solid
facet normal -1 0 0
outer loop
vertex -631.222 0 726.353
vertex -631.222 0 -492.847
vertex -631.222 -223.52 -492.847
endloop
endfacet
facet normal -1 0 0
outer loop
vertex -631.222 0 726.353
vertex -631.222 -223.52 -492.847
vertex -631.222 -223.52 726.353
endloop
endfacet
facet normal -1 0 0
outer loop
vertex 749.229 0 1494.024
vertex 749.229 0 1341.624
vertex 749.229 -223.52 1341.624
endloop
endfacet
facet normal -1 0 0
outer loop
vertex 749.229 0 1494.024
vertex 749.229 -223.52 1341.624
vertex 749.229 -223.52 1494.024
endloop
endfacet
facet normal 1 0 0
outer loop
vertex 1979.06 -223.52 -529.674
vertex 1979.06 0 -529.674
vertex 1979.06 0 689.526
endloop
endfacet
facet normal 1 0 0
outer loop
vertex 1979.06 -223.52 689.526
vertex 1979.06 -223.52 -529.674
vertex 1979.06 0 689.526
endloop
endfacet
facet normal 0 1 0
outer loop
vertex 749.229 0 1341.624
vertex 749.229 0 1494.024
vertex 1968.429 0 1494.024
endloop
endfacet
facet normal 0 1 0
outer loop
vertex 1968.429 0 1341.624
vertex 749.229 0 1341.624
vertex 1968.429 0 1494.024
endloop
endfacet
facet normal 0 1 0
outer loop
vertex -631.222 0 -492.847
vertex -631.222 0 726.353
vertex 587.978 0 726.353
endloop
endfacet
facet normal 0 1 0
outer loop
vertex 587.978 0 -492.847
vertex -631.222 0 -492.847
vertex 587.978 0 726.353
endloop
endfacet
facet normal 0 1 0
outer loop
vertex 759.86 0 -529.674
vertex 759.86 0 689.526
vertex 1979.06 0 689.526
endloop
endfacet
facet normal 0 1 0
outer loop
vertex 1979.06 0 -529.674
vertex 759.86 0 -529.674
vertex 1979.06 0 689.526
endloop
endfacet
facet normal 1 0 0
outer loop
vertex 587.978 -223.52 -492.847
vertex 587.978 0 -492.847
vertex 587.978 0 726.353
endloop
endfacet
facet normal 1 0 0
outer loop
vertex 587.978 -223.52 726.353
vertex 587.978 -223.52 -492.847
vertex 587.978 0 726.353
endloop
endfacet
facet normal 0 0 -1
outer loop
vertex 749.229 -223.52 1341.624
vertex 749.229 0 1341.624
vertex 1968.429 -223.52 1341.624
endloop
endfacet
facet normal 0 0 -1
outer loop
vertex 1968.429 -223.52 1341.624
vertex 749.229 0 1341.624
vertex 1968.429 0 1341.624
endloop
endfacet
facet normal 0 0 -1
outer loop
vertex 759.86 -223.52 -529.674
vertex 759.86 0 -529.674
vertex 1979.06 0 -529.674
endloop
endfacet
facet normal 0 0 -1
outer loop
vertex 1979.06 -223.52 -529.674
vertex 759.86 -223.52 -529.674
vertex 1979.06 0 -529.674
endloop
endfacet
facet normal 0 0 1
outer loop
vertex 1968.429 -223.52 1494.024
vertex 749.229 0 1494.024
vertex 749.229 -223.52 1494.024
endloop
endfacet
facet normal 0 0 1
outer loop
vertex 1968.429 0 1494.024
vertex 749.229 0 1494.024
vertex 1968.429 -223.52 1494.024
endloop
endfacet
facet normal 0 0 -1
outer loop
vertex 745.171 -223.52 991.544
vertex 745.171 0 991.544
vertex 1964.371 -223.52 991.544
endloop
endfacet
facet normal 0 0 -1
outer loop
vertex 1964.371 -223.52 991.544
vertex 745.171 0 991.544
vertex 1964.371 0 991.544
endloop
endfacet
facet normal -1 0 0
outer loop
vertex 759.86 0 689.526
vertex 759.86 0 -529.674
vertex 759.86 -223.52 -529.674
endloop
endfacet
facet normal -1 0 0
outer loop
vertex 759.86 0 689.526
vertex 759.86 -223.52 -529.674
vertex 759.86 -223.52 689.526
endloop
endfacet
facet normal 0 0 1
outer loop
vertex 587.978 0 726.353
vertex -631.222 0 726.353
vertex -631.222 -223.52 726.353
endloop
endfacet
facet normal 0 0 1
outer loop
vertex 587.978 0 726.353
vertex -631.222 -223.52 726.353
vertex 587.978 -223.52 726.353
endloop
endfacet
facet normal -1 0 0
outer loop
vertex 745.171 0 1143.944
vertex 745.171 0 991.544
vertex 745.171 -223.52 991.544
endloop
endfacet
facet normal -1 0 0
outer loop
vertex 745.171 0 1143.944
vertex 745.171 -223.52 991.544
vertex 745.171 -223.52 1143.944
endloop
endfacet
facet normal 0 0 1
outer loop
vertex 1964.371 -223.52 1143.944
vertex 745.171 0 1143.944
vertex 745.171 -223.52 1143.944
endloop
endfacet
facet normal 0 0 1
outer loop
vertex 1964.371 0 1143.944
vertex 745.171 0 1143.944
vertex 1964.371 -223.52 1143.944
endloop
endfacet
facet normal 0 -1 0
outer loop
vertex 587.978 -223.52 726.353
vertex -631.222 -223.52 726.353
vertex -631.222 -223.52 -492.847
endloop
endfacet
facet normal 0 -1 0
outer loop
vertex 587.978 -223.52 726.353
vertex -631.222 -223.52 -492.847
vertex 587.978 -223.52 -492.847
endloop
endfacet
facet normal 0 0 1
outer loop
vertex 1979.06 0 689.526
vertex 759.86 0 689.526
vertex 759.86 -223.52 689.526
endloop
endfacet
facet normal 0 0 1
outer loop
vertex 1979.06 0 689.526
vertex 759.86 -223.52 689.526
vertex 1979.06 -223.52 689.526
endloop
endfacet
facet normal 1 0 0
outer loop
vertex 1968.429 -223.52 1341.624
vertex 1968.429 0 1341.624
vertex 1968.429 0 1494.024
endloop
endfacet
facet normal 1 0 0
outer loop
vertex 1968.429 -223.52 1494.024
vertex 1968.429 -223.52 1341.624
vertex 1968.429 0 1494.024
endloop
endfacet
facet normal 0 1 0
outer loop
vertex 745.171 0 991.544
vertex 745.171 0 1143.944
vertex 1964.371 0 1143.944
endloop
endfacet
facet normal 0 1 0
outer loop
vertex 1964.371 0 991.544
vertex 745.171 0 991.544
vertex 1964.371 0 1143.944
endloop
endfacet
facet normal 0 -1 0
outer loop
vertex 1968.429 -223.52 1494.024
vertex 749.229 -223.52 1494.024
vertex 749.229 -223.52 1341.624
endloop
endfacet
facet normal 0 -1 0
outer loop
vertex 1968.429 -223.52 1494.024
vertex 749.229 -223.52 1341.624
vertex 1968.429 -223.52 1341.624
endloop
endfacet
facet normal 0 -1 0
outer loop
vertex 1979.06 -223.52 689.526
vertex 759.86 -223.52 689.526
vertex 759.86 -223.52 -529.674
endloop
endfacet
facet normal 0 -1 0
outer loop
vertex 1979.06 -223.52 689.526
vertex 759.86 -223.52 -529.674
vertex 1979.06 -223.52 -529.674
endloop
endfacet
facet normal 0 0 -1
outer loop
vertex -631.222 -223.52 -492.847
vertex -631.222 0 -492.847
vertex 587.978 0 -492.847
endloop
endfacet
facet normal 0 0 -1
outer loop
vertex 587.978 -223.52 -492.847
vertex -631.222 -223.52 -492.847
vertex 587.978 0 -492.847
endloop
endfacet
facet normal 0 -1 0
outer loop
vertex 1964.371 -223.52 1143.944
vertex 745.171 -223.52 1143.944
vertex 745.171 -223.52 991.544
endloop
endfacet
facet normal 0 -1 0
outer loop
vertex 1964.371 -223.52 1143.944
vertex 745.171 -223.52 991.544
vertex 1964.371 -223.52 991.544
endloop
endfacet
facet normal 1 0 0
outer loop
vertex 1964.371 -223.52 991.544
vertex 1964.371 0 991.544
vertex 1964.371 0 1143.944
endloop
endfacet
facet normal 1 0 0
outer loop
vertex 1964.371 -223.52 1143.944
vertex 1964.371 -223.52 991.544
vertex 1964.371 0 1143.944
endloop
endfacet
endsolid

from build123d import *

# Parameters (mm, degrees)
F0_W     = 1219.2
F0_H     = 1219.2
F3_W     = 1219.2
F3_H     = 1219.2
F2_W     = 1219.2
F2_H     = 152.4
F1_W     = 1219.2
F1_H     = 152.4
F4_DEPTH = 223.52


with BuildPart() as f4:
    # F0 (on Front) + F3 (on Front) + F2 (on Front) + F1 (on Front) → F4 (new body)
    with BuildSketch(Plane.XZ):
        with Locations((-21.622136, 116.752973)):
            Rectangle(F0_W, F0_H)
    with BuildSketch(Plane.XZ):
        with Locations((1369.459987, 79.925937)):
            Rectangle(F3_W, F3_H)
    with BuildSketch(Plane.XZ):
        with Locations((1354.771346, 1067.744424)):
            Rectangle(F2_W, F2_H)
    with BuildSketch(Plane.XZ):
        with Locations((1358.829021, 1417.82448)):
            Rectangle(F1_W, F1_H)
    extrude(amount=F4_DEPTH)


solid = f4.part
